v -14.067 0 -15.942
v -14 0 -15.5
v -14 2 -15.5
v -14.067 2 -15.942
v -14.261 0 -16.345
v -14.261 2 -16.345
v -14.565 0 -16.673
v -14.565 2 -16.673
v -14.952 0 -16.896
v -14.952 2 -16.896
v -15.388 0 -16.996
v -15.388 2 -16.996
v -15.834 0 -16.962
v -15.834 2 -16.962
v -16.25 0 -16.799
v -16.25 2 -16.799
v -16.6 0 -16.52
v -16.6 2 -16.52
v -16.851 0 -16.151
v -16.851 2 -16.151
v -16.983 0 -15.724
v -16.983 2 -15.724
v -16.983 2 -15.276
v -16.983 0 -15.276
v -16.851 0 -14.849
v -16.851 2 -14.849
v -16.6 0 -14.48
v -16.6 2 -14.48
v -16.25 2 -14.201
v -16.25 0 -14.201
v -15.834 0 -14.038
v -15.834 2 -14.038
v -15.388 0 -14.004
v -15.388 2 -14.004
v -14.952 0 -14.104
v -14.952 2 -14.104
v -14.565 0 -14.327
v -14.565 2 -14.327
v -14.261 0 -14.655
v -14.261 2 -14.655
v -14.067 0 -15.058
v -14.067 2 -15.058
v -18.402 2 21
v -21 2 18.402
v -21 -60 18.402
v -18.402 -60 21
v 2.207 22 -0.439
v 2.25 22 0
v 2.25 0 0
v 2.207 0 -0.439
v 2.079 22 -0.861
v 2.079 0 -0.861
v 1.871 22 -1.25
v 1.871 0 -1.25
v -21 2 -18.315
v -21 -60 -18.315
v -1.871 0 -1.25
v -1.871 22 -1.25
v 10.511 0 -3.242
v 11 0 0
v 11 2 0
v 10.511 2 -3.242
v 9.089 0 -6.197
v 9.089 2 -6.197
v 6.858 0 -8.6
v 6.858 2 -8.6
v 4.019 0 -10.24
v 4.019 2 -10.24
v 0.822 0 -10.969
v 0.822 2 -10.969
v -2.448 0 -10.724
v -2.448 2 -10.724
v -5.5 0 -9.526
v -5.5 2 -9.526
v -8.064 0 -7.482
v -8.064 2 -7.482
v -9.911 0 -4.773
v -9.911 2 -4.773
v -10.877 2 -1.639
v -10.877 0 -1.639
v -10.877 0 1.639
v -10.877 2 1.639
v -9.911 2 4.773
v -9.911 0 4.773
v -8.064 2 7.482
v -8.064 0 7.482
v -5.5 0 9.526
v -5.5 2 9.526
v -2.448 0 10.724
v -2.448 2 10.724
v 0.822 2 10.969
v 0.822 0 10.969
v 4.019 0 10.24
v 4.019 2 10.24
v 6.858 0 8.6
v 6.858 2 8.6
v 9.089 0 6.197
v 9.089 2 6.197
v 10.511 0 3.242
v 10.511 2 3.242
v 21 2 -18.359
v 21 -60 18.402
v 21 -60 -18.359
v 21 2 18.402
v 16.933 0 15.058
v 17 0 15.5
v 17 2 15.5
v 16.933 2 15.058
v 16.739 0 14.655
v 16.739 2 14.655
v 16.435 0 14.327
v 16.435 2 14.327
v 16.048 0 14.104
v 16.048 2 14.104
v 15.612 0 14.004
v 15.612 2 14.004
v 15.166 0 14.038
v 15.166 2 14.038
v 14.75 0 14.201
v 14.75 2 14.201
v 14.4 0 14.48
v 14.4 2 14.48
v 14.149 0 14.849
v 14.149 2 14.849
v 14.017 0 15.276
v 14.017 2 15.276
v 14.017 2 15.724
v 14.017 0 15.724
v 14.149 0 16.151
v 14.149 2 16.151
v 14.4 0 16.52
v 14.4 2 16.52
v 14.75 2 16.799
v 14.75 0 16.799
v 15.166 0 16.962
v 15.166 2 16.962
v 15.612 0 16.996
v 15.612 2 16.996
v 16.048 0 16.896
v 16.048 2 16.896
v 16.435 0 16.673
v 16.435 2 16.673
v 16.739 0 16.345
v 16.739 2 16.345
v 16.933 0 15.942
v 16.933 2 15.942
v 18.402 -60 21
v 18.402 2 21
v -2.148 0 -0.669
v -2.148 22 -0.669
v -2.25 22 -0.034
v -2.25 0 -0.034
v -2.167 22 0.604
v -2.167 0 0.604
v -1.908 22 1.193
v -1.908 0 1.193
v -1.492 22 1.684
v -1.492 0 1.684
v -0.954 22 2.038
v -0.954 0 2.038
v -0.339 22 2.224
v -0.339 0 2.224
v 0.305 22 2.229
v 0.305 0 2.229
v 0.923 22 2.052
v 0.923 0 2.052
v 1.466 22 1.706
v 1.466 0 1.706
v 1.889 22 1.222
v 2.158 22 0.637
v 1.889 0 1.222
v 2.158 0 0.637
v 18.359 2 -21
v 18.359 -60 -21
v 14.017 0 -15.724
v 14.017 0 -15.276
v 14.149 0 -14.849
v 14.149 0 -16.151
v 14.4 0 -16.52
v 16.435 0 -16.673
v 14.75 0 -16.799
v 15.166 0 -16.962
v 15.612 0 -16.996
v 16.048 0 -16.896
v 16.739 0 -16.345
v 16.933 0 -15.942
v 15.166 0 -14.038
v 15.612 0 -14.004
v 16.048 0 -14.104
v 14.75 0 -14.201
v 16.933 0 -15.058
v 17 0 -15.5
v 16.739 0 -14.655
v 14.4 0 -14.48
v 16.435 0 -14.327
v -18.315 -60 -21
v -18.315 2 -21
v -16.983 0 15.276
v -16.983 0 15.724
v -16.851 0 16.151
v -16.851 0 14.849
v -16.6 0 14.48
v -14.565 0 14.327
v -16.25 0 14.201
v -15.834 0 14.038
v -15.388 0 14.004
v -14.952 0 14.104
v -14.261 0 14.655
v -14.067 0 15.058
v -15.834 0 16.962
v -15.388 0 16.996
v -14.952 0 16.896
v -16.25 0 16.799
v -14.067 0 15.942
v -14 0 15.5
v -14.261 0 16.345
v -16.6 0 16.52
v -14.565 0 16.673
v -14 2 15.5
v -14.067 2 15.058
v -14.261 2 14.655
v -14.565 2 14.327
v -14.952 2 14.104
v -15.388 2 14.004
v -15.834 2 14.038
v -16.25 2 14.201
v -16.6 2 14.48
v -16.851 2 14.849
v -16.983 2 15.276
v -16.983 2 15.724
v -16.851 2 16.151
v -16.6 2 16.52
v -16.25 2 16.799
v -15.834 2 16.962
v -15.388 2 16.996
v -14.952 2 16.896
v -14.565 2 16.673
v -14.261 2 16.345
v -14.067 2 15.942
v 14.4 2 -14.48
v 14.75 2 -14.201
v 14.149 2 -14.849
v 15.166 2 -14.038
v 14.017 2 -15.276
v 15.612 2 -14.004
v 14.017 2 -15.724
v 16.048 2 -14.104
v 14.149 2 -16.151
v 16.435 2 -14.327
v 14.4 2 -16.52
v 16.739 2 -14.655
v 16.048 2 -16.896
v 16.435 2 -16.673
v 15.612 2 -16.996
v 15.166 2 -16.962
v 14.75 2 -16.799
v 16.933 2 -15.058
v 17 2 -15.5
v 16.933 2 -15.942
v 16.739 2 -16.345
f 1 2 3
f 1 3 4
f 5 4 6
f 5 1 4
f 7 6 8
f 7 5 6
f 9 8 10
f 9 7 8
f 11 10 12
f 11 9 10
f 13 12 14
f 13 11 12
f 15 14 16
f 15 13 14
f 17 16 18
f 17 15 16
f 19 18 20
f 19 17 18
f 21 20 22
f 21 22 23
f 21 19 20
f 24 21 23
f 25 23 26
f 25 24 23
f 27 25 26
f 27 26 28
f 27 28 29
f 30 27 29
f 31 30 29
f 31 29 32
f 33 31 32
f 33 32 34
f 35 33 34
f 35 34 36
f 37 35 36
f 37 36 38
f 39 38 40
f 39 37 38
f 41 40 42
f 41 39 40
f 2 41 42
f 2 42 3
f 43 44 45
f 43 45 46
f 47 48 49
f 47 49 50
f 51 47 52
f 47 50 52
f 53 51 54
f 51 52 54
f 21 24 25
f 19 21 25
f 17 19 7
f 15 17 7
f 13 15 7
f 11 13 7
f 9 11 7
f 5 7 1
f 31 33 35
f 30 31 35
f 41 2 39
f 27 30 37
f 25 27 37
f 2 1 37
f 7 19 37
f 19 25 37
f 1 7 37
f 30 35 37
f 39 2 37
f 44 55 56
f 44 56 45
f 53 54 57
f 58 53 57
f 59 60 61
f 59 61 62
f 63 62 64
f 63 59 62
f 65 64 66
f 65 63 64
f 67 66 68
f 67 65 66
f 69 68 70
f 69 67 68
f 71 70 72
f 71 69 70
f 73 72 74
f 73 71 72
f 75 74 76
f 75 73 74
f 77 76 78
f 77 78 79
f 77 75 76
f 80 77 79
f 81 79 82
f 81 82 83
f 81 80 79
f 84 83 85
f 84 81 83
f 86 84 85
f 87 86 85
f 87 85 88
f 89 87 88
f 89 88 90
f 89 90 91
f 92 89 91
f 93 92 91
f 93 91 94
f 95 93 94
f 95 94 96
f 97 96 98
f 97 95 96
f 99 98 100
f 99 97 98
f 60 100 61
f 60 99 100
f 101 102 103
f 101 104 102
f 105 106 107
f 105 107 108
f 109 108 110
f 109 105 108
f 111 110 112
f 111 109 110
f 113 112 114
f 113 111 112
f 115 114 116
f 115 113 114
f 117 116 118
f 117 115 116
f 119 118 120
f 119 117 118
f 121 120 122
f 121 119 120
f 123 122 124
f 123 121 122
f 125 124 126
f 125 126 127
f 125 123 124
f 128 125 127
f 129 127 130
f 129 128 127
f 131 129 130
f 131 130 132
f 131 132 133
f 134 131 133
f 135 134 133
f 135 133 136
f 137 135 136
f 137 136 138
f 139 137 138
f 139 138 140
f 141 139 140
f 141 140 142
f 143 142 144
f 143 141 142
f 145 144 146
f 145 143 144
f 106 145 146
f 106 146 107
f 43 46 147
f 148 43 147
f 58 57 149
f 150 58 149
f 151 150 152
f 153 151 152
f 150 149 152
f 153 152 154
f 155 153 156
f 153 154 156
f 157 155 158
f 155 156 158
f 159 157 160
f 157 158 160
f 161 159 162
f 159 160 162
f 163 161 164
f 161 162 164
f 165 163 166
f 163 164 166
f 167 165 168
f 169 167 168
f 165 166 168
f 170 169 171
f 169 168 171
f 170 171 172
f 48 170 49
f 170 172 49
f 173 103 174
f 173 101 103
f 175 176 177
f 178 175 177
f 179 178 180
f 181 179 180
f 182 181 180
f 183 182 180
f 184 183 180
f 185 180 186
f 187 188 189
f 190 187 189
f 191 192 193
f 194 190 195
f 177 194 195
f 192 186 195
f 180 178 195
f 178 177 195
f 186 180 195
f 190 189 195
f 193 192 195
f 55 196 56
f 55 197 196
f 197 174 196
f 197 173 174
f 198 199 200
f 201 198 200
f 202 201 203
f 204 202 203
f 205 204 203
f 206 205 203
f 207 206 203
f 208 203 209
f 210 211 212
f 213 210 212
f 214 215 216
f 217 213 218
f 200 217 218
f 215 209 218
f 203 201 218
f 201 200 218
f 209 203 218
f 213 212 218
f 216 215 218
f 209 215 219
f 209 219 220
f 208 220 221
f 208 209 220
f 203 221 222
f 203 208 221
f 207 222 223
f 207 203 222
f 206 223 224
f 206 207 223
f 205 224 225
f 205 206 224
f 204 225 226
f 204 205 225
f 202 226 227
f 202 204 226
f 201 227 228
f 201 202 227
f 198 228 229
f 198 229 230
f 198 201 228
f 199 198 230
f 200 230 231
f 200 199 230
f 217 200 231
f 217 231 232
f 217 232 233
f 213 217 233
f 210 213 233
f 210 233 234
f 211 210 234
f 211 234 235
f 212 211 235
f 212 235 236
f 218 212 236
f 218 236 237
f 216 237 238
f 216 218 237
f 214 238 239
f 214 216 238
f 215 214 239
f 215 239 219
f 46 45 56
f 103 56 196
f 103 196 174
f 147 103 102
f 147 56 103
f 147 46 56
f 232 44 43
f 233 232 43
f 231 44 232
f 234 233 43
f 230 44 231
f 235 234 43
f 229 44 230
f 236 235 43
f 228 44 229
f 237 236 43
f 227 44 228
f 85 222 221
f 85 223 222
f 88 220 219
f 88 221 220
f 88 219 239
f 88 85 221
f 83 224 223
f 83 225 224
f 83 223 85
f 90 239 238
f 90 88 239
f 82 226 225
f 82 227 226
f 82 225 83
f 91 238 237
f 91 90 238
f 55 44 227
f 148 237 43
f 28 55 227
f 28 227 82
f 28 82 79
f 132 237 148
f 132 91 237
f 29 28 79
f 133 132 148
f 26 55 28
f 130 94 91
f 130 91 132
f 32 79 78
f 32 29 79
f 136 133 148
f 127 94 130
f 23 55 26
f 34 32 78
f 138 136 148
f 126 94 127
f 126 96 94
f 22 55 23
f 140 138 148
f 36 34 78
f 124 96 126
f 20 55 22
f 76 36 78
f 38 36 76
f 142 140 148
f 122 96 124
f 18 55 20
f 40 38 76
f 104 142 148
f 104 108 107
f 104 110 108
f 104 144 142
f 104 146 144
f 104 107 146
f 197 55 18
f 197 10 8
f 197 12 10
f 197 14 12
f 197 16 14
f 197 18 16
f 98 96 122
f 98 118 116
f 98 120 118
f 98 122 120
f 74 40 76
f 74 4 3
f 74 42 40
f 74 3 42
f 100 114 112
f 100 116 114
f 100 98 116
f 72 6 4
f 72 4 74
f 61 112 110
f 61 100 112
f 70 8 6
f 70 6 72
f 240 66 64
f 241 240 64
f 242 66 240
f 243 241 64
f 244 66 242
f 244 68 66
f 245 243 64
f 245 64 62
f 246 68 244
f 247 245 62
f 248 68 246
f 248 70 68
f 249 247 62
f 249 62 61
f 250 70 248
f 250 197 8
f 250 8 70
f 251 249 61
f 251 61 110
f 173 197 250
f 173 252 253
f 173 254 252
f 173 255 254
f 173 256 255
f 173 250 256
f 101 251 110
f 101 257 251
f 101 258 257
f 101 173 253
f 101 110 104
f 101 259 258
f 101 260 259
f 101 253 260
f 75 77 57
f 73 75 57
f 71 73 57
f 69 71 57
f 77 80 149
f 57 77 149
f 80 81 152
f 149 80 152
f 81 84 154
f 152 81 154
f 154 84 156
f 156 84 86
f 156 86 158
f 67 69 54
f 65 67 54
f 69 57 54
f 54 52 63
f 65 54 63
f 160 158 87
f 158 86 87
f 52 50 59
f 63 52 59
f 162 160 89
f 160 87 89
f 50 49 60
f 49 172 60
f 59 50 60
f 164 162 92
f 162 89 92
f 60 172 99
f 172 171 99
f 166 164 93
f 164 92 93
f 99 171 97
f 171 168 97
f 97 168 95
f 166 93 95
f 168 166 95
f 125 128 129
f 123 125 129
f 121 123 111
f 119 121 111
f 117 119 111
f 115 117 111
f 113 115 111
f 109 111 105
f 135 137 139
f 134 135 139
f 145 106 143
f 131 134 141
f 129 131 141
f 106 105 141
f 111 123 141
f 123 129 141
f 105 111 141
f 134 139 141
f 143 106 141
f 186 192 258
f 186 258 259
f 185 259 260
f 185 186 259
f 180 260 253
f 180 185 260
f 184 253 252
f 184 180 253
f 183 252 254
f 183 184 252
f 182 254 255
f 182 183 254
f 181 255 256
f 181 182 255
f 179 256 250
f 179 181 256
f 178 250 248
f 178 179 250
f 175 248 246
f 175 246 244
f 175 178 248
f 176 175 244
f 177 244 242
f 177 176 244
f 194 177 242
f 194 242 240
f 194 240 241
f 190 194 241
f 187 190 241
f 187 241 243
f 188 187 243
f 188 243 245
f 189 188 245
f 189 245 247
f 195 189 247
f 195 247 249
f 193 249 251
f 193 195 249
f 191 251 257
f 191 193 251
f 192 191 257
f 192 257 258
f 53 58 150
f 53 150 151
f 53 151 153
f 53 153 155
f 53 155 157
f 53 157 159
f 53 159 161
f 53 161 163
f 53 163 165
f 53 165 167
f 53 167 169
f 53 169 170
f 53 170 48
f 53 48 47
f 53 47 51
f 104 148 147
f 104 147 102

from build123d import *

# Parameters (mm, degrees)
EXTRUDE_1_DEPTH      = 2
EXTRUDE_1_DEPTH_BACK = 60
SKETCH_1_R           = 1.5
SKETCH_1_R_2         = 11
EXTRUDE_2_DEPTH      = 22
SKETCH_2_R           = 11
SKETCH_2_R_2         = 1.5
EXTRUDE_3_DEPTH      = 60


with BuildPart() as part:
    # 草图1 → 凸台-拉伸1 (new, two sides: drawn at the far end of the back side and taken through both)
    with BuildSketch(Plane(origin=(0, 0, 0), x_dir=(1, 0, 0), z_dir=(0, 1, 0)).offset(-EXTRUDE_1_DEPTH_BACK)):
        Polygon((-18.315463918, 21), (-21, 18.315463918), (-21, -18.402061856), (-18.402061856, -21), (18.402061856, -21), (21, -18.402061856), (21, 18.358762887), (18.358762887, 21), align=None)
        with Locations((-15.5, -15.5)):
            Circle(SKETCH_1_R, mode=Mode.SUBTRACT)
        with Locations((15.5, -15.5)):
            Circle(SKETCH_1_R, mode=Mode.SUBTRACT)
        Circle(SKETCH_1_R_2, mode=Mode.SUBTRACT)
        with Locations((-15.5, 15.5)):
            Circle(SKETCH_1_R, mode=Mode.SUBTRACT)
        with Locations((15.5, 15.5)):
            Circle(SKETCH_1_R, mode=Mode.SUBTRACT)
    extrude(amount=EXTRUDE_1_DEPTH + EXTRUDE_1_DEPTH_BACK)



with BuildPart() as body_2:
    # 草图1<3> → 凸台-拉伸2 (new body)
    with BuildSketch(Plane(origin=(0, 0, 0), x_dir=(1, 0, 0), z_dir=(0, 1, 0))):
        with BuildLine():
            Line((1.870828693, 1.25), (-1.870828693, 1.25))
            ThreePointArc((-1.870828693, 1.25), (-0.65312152, -2.15312152), (2.25, 0))
            ThreePointArc((2.25, 0), (2.15312152, 0.65312152), (1.870828693, 1.25))
        make_face()
    extrude(amount=EXTRUDE_2_DEPTH)


with BuildPart() as part_1:
    add(part.part)

    add(body_2.part)  # 凸台-拉伸3 merges body 2
    # 草图2 → 凸台-拉伸3 (add)
    with BuildSketch(Plane.XZ.offset(60)):
        Circle(SKETCH_2_R)
        with Locations((-15.5, 15.5)):
            Circle(SKETCH_2_R_2)
        with Locations((15.5, 15.5)):
            Circle(SKETCH_2_R_2)
        with Locations((-15.5, -15.5)):
            Circle(SKETCH_2_R_2)
        with Locations((15.5, -15.5)):
            Circle(SKETCH_2_R_2)
    extrude(amount=-EXTRUDE_3_DEPTH)


solid = part_1.part
